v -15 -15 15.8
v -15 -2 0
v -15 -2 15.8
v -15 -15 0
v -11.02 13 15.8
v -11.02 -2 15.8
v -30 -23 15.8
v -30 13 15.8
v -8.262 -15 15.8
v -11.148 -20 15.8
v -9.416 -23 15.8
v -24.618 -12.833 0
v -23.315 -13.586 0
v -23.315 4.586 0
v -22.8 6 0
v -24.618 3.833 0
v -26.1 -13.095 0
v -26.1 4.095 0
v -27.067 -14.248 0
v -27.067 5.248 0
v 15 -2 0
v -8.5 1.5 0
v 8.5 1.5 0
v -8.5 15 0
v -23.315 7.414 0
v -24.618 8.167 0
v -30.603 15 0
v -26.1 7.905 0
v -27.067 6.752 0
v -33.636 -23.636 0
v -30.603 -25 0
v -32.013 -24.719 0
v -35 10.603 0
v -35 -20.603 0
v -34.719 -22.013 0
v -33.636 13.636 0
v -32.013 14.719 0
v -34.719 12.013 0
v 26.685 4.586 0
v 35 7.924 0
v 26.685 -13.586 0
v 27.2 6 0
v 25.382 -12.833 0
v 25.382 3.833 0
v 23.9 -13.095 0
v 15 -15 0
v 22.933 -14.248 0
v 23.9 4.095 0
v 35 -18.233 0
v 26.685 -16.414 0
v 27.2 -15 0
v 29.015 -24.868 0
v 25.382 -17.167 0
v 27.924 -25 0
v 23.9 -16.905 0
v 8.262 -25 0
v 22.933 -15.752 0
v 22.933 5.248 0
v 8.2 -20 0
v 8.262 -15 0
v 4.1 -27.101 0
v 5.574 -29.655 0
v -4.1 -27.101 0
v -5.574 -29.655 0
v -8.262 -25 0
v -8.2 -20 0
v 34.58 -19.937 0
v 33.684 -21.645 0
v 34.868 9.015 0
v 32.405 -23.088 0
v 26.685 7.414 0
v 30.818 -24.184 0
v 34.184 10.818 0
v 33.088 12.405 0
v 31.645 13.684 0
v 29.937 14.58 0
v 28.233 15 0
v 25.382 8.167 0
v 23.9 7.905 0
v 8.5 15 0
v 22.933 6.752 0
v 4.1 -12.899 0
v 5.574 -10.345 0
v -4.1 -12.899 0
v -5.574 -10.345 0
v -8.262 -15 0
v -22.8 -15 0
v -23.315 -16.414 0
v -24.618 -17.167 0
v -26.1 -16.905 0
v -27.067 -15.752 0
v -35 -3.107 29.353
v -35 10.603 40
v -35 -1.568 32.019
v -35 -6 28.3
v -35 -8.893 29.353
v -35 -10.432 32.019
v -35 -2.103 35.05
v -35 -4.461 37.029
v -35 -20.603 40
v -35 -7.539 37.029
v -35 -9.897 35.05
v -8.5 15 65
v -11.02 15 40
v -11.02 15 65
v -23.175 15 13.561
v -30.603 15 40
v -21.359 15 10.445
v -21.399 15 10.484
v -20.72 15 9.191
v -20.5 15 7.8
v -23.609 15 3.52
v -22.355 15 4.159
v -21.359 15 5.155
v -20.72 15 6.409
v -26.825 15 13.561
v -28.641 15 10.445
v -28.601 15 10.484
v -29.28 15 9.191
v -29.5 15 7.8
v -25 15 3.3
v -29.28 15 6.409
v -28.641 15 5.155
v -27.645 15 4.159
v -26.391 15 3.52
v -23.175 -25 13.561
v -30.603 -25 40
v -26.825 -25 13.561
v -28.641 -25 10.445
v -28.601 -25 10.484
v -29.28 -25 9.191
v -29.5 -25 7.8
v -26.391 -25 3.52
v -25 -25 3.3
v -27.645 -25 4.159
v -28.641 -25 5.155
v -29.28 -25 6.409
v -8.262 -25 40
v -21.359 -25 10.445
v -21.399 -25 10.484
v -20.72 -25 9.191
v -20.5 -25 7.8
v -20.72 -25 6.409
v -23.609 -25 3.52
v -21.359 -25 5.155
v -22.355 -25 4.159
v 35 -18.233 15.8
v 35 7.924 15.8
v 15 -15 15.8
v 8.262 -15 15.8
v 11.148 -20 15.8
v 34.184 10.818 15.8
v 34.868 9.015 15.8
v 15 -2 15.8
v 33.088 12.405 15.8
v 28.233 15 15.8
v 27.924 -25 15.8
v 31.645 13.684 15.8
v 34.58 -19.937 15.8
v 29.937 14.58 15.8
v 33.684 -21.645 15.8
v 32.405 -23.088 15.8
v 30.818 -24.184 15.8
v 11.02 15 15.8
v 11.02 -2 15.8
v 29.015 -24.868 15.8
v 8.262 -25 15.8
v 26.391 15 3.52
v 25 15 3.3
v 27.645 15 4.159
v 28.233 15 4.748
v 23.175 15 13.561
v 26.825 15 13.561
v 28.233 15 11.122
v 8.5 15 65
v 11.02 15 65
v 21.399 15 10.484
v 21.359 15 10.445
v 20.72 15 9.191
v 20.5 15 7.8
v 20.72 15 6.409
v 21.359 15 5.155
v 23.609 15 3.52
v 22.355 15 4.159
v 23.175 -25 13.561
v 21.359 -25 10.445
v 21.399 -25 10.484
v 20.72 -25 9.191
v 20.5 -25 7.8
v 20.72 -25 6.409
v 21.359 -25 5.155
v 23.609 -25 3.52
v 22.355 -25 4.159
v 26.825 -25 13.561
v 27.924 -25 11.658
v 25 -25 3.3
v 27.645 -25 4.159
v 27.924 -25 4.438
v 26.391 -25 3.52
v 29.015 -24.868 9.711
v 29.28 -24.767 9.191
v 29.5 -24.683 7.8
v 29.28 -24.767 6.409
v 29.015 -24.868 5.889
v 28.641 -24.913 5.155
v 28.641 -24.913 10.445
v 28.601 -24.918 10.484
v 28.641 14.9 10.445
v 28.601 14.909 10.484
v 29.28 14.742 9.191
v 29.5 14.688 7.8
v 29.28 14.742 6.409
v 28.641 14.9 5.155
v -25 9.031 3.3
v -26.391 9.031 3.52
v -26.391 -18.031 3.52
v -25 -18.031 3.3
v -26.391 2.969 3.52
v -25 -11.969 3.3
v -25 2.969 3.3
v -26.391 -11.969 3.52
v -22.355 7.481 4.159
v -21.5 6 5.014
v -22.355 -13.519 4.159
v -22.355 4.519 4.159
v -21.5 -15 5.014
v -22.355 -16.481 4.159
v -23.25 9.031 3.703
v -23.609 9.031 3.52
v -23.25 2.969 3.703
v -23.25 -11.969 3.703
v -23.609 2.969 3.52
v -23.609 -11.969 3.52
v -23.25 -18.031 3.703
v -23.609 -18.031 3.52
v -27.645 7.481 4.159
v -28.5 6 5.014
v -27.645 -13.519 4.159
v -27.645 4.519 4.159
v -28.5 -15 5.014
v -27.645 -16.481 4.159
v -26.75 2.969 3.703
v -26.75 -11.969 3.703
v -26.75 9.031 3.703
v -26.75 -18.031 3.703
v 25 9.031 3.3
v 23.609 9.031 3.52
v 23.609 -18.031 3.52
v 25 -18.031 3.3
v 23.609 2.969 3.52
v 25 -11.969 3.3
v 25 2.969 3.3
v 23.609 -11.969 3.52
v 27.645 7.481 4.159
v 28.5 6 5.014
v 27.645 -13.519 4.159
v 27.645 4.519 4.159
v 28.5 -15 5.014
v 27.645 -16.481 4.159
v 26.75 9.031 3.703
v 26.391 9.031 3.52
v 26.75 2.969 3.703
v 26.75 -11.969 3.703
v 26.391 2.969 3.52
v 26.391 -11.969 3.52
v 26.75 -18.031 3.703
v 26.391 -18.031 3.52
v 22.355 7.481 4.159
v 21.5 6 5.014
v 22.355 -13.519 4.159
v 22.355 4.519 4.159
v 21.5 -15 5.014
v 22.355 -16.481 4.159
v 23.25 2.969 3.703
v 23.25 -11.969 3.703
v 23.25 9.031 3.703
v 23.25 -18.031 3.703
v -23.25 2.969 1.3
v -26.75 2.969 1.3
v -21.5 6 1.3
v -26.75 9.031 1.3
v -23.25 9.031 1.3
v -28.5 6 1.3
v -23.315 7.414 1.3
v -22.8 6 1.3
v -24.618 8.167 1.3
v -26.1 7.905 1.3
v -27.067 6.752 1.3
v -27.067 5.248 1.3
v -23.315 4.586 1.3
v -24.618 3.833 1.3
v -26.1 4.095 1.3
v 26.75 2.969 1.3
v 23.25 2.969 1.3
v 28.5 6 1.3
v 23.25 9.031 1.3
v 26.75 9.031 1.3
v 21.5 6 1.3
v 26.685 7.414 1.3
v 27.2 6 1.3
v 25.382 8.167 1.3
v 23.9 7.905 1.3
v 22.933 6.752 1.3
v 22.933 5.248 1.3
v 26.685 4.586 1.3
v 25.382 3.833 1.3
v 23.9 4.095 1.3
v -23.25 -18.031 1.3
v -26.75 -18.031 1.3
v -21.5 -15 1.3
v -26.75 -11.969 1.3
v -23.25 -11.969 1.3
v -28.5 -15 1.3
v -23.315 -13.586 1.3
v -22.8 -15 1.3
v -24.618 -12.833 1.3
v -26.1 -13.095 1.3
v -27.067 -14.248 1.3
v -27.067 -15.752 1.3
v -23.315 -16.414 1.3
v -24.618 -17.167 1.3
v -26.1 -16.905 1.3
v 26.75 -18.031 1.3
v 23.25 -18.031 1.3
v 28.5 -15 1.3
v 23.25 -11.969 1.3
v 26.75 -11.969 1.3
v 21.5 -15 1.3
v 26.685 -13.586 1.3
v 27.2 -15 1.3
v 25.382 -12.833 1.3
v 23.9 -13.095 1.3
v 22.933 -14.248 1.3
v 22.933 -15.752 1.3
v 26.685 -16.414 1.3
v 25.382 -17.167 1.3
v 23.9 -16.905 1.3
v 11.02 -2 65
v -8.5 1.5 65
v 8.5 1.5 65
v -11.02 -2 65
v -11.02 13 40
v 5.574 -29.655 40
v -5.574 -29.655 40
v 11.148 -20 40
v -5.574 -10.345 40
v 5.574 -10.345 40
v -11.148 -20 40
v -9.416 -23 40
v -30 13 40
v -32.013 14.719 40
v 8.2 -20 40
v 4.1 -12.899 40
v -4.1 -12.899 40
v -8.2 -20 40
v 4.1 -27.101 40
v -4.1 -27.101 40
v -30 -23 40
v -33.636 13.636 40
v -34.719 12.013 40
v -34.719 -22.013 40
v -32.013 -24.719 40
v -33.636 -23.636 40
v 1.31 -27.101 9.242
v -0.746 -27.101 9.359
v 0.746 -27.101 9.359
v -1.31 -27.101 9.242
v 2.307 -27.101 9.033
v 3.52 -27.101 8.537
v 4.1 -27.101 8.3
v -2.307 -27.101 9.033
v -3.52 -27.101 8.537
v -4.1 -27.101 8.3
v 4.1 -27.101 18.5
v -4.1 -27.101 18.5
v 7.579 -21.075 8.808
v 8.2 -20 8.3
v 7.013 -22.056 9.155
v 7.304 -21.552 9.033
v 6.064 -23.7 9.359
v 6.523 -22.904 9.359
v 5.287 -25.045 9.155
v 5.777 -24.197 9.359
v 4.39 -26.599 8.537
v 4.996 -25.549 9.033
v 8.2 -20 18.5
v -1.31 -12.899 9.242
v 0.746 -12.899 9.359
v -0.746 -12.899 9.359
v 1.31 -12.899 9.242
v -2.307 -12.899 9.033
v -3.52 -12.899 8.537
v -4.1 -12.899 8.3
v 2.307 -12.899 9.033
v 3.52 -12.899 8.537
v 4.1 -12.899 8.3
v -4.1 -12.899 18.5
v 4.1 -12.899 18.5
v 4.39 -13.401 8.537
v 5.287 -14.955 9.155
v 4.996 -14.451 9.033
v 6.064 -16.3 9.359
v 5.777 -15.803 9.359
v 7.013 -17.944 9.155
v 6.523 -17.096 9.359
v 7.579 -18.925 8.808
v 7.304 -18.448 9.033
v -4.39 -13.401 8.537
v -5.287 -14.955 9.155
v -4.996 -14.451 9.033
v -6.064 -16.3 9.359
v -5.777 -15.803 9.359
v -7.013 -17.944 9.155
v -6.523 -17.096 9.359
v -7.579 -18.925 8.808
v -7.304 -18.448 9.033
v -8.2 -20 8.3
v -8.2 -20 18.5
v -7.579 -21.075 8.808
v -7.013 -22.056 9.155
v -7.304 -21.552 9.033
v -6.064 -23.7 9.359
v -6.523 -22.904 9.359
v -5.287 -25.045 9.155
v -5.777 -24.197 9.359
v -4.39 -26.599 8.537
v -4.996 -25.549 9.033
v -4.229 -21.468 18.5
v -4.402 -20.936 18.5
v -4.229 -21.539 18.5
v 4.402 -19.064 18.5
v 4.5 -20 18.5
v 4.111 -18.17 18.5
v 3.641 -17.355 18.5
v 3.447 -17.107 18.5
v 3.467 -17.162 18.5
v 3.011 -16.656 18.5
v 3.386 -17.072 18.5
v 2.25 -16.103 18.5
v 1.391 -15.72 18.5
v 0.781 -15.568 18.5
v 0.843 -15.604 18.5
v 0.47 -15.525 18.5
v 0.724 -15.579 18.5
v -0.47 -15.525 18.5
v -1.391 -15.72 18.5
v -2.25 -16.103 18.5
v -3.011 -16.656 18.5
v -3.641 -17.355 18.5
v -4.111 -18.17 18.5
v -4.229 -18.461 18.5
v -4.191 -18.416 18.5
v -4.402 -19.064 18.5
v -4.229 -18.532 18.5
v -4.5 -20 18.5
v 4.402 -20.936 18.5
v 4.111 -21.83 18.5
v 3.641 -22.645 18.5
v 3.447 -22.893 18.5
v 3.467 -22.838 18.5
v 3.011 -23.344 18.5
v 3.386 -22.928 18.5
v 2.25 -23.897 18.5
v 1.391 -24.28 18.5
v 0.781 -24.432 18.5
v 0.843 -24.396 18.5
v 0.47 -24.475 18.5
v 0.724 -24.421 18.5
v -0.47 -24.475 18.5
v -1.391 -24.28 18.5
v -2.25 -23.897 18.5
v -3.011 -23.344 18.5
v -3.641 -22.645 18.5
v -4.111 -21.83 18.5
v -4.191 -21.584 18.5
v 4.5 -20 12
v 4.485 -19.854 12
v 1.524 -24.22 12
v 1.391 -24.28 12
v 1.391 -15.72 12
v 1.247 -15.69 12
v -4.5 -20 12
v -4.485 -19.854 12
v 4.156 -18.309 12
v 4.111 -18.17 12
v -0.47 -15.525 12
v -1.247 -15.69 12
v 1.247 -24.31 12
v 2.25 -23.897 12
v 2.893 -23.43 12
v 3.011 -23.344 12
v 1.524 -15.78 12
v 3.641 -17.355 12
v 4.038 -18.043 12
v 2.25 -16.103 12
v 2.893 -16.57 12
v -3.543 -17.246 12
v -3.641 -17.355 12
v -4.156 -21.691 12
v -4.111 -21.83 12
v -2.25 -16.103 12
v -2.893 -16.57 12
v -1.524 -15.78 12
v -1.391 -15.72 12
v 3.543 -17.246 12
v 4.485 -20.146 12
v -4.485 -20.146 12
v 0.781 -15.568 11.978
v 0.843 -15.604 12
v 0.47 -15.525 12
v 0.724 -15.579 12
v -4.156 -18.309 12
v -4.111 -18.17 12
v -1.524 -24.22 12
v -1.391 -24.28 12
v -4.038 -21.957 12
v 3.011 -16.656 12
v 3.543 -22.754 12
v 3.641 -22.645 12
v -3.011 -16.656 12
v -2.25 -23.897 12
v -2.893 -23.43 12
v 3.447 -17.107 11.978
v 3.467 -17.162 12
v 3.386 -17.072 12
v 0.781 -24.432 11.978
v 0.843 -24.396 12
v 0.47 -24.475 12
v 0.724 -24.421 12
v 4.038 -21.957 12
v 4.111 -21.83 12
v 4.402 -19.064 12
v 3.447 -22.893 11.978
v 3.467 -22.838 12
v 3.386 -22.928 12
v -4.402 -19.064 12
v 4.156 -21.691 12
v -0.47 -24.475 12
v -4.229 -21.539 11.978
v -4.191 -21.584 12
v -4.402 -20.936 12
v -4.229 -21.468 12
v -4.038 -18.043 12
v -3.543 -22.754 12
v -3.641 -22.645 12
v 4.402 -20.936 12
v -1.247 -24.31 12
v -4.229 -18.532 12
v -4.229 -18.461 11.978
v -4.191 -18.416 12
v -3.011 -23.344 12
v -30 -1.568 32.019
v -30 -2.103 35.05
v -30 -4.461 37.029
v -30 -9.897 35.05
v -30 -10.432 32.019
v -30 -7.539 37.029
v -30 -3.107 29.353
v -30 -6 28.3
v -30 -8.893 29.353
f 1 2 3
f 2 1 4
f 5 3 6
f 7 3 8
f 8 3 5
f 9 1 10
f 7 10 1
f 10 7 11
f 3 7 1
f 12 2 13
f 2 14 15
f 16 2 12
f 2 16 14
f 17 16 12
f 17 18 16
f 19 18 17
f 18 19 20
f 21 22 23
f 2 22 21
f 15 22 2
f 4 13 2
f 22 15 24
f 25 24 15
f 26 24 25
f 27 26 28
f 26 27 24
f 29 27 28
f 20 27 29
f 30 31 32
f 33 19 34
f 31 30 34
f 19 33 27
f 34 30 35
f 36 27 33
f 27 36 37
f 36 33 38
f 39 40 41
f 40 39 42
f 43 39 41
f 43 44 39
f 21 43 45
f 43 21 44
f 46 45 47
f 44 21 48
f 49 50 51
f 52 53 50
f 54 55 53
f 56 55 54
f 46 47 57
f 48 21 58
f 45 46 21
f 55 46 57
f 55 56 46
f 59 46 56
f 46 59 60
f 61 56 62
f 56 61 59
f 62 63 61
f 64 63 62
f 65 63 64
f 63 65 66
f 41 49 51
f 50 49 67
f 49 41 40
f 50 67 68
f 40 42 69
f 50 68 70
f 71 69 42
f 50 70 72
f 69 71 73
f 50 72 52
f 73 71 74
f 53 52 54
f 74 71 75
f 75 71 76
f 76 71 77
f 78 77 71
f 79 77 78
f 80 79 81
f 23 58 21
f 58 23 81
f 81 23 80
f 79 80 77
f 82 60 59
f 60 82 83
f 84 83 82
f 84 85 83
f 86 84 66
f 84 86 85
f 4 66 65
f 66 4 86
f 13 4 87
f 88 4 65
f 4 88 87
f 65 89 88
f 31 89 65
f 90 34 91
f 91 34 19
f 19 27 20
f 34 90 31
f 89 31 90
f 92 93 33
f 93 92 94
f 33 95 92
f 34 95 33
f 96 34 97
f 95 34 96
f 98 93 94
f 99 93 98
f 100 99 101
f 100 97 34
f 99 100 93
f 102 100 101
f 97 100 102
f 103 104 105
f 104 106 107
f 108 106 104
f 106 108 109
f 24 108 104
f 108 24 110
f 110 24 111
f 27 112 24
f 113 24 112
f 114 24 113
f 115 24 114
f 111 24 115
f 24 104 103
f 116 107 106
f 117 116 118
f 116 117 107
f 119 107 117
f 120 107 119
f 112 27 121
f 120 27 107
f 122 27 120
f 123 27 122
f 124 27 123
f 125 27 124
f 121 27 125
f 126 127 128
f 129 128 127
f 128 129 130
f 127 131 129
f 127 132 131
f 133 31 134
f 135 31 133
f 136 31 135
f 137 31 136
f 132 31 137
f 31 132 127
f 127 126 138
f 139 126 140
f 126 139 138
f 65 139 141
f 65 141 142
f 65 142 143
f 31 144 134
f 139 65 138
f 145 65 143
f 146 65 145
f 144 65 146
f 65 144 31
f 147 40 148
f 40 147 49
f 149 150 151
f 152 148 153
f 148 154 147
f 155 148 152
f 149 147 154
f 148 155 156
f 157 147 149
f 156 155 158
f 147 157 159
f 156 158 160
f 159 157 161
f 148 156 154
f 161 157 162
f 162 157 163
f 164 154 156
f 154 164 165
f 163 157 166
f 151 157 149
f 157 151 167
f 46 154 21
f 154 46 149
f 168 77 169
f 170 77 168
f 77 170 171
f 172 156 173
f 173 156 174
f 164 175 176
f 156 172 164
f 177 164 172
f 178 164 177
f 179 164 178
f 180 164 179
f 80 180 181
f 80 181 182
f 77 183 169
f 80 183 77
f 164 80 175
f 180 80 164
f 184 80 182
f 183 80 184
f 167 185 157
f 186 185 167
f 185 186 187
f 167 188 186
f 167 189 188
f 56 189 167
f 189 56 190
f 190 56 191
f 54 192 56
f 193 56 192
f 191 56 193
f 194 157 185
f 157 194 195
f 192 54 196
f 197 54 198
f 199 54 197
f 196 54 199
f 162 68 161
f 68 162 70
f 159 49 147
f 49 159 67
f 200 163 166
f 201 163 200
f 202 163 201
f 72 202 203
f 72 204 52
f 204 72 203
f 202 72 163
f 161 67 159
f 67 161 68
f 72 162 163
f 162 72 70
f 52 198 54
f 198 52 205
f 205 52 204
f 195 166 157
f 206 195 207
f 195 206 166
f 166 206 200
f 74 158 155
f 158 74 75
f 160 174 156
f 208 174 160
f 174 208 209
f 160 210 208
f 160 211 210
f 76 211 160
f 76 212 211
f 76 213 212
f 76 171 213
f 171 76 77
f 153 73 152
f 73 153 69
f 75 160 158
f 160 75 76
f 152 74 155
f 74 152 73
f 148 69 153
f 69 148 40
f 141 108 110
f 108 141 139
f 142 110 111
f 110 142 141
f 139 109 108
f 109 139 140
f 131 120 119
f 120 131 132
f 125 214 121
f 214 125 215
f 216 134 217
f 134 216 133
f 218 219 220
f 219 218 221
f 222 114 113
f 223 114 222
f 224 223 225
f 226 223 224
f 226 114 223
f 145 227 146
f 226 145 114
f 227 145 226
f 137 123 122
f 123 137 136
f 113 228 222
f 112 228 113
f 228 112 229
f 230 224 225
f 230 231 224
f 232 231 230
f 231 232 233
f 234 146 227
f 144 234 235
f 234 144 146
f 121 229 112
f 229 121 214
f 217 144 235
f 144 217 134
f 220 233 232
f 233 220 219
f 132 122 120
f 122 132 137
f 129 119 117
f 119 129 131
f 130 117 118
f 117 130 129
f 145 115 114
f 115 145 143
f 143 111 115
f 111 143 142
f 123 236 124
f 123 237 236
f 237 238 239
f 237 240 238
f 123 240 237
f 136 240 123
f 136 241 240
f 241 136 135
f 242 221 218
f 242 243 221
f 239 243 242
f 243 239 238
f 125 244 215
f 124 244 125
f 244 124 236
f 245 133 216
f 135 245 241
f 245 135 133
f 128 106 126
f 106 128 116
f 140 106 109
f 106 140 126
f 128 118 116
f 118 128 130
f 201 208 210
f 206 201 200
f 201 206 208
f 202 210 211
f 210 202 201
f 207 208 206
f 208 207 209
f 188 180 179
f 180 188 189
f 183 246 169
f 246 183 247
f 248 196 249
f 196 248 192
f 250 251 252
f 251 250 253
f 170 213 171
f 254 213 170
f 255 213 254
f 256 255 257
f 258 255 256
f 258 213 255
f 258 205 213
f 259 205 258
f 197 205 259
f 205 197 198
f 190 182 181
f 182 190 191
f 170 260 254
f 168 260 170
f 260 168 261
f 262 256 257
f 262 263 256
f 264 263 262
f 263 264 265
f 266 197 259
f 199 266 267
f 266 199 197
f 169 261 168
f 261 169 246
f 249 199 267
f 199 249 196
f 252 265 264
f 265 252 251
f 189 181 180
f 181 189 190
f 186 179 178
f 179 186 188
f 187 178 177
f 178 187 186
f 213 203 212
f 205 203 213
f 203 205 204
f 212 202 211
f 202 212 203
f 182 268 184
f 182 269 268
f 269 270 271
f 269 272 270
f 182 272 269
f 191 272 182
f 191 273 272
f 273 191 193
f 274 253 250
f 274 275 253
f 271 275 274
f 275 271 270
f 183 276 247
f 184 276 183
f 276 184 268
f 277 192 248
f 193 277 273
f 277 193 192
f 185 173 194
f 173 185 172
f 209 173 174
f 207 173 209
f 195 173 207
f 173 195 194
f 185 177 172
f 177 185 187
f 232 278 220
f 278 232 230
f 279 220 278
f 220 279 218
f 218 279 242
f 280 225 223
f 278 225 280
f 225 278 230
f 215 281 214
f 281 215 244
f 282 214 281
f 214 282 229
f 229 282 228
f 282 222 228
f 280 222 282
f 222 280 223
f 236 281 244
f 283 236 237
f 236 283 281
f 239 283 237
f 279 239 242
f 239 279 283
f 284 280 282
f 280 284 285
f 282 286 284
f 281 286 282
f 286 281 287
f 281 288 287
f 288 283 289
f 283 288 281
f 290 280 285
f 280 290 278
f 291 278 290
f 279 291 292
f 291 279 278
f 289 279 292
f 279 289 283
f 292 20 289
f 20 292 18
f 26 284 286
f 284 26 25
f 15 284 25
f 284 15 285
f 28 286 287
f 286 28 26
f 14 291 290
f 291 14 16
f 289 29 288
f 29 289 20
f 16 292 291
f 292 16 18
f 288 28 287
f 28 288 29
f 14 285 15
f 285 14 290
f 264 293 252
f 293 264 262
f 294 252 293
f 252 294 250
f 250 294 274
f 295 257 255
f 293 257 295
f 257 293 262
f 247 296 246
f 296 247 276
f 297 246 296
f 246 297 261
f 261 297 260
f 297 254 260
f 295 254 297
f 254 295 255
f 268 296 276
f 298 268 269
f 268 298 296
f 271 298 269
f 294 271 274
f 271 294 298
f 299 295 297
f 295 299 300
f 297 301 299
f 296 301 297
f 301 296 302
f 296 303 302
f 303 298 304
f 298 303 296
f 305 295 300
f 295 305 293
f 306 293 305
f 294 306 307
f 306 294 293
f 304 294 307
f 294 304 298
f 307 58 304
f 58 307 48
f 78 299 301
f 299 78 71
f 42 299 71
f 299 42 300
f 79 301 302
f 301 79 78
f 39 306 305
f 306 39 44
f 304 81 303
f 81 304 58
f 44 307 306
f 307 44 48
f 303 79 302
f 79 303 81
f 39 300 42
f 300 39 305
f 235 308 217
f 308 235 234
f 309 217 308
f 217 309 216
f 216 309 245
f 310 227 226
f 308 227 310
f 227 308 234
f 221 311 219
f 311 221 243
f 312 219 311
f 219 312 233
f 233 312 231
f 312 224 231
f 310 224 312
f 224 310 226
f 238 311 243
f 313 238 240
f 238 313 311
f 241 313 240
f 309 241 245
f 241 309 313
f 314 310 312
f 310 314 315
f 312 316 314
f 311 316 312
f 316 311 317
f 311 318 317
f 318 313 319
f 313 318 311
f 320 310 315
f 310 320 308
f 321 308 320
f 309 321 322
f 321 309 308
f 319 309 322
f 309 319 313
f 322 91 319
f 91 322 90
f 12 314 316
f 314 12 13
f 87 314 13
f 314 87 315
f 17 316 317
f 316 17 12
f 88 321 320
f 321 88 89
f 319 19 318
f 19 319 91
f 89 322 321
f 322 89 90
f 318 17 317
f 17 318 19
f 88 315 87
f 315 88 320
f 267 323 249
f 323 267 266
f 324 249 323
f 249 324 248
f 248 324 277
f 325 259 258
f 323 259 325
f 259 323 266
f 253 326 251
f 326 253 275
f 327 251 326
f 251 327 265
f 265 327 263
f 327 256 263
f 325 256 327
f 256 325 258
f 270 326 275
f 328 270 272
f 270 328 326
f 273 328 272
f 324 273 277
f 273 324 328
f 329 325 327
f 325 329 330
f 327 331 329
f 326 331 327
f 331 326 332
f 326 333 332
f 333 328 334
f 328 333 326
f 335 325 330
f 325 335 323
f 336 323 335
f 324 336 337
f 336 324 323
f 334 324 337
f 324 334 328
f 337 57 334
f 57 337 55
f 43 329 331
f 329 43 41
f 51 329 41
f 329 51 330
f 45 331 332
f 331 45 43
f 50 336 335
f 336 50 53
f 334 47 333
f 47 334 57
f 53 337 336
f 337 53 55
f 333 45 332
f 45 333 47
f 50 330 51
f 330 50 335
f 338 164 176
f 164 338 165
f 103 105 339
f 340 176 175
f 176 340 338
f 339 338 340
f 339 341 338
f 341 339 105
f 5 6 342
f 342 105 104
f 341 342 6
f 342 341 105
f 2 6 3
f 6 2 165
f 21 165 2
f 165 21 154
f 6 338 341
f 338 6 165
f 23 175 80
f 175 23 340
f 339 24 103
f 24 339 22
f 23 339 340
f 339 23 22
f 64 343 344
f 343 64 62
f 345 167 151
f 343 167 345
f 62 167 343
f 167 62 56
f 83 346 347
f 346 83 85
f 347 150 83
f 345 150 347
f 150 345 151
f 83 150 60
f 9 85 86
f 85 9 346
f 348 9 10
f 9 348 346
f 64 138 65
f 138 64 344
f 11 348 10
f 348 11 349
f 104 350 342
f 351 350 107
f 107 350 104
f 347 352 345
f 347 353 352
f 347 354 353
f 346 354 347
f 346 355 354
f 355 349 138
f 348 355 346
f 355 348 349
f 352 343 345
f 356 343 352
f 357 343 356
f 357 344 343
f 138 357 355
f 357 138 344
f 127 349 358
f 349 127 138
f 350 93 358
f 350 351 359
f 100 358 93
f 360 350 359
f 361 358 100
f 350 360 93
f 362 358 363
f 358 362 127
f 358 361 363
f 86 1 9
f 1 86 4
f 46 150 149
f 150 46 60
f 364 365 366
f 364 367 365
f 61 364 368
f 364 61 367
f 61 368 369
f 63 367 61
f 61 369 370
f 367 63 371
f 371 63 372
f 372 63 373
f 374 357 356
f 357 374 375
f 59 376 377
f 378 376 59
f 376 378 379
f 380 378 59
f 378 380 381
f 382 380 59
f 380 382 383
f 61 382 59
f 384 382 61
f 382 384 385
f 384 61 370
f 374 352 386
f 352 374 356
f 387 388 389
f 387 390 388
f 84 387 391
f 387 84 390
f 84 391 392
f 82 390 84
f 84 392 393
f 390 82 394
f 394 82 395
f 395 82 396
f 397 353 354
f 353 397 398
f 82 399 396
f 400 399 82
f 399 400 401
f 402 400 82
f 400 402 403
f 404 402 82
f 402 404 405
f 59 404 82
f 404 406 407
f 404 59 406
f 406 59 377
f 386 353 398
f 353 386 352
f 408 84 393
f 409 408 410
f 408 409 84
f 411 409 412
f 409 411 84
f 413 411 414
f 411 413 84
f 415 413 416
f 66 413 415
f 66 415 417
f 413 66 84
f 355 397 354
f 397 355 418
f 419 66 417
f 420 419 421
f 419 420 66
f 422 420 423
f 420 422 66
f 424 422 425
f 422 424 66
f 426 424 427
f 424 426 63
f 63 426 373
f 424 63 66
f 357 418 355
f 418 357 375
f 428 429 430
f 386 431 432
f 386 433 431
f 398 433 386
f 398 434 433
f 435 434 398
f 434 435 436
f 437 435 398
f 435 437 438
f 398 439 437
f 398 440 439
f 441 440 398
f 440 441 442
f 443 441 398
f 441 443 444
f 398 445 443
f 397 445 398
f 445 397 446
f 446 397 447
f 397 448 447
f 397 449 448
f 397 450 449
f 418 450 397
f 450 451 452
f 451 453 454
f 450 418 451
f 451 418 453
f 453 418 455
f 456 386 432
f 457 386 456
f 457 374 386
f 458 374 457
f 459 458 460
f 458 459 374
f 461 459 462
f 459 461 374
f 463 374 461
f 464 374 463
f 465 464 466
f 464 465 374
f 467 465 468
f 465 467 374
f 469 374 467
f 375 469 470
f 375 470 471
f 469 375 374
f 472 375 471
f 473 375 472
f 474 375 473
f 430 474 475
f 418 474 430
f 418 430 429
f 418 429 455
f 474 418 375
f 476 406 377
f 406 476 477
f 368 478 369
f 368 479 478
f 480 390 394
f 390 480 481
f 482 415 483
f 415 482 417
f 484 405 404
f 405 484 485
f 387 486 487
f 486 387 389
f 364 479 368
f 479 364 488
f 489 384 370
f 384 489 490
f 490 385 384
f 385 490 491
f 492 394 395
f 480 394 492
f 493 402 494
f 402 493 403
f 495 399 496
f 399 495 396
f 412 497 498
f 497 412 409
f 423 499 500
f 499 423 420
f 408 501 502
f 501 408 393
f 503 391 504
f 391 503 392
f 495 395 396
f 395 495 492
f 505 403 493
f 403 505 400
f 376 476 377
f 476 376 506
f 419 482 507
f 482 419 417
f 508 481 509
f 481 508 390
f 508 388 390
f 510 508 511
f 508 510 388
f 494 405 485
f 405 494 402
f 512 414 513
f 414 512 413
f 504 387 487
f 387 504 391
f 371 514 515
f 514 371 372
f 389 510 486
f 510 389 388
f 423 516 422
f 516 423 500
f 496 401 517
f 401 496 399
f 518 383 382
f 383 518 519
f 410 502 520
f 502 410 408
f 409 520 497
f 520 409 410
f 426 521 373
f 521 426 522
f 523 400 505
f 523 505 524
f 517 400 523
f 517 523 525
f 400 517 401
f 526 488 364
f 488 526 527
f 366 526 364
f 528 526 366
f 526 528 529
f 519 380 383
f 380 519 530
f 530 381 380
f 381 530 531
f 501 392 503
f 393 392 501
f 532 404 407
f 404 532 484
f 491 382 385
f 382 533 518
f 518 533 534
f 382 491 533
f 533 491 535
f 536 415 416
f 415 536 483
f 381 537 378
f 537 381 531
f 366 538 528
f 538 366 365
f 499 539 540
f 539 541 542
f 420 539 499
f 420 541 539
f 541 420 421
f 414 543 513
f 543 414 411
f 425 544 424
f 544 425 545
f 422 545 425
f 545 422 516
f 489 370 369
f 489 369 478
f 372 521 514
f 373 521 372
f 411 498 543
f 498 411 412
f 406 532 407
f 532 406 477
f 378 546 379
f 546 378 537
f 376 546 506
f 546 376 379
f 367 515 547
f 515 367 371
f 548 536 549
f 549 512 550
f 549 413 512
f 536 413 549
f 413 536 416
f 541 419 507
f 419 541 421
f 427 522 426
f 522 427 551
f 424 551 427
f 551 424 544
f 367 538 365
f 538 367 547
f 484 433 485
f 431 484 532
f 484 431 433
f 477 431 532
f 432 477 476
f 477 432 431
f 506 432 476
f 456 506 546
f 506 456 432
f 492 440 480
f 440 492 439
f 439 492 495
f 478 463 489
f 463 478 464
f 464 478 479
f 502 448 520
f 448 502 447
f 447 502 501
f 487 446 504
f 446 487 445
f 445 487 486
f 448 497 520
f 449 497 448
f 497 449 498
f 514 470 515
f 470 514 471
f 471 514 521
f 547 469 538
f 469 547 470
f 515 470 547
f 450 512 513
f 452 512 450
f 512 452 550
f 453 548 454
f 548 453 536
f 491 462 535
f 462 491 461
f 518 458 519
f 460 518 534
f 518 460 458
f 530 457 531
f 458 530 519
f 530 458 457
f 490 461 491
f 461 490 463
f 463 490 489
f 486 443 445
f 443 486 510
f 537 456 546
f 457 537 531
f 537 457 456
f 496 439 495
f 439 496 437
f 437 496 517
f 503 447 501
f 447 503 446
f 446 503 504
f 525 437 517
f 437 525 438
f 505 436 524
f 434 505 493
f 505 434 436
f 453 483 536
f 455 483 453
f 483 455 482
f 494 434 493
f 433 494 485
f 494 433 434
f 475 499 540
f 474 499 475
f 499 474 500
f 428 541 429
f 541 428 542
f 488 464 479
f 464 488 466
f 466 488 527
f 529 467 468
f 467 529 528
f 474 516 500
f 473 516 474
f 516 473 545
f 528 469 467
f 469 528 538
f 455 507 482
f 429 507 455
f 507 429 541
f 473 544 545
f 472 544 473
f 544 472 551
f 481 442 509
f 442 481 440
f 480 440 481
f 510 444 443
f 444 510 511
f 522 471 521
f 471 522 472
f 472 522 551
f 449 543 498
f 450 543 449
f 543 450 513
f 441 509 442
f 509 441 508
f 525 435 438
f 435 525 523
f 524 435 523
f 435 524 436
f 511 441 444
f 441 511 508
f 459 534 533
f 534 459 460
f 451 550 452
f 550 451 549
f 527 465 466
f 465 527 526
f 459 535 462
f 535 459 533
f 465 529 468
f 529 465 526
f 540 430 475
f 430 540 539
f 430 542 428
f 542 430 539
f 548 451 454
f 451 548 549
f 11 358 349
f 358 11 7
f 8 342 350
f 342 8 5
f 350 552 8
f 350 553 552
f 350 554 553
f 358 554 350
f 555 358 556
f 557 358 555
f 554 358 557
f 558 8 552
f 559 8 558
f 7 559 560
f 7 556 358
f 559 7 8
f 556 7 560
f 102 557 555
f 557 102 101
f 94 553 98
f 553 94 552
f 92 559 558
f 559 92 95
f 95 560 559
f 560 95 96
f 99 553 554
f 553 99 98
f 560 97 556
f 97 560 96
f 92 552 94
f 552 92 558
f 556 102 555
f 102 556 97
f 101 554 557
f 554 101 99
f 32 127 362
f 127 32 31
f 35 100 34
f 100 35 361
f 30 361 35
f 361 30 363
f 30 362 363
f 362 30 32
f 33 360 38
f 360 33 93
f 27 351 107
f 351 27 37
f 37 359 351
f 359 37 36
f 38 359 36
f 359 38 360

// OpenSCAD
// file: ../configuration.scad
// PRUSA Mendel  
// Configuration file
// GNU GPL v2
// Josef Pra
// josefprusa@me.com
// prusadjs.cz
// http://www.reprap.org/wiki/Prusa_Mendel
// http://github.com/prusajr/PrusaMendel


// PLEASE SELECT ONE OF THE CONFIGURATIONS BELOW
// BY UN-COMMENTING IT


variant=0; //0 for metric
//variant=1; //1 for SAE
if(variant==0){
echo("variant: metric");
}else if(variant==1){
echo("variant: sae");
} else{
echo("WARNING: INVALID CONFIGURATION");
}




vars=[
//[m8_dia, m8_nut, m4_dia, m4_nut, m3_dia, m3_nut, bush_dia, mot_shaft, bush_rod, bush_outerdia, bush_length]
[9,16.4,5,9,4.4,7,11,5.3,8,16,11],//metric
[9,15.7,5.5,10.6,5.5,10.6,11.5,5.3,7.9375,16,11]//SAE
];


//BUSHING TYPE Can generate three versions
// 1 - regular old ones
// 2 - helical ones
// 3 - holders for brass or any other bought bushings
bushing_type = 2;


//Round corner diameter
round_corner_diameter = 8;


//Thin wall size
layer_height = 0.4;
perimeter_width_over_thicknes = 1.6;
infill_widht_over_thickness = 1.55;
thin_wall = 2*(perimeter_width_over_thicknes*layer_height+infill_widht_over_thickness*layer_height);
if(thin_wall<2){
	echo("Check thin wall size, its below 2mm!");
}
echo(thin_wall);


//DO NOT TOUCH THIS SECTION!
m8_diameter = vars[variant][0];
m8_nut_diameter = vars[variant][1];
m4_diameter = vars[variant][2];
m4_nut_diameter = vars[variant][3];
m3_diameter = vars[variant][4];
m3_nut_diameter = vars[variant][5];
bushing_diameter = vars[variant][6];
motor_shaft=vars[variant][7];
bushing_rodsize = vars[variant][8];
bushing_outerDiameter = vars[variant][9];
bushing_lenght = vars[variant][10];




// MINI-HUXLEY VERSION (TODO, just place holder)
// include <configuration-huxley.scad>


// MEGA VERSION (TODO, just place holder)
// include <configuration-mega.scad>




// Some basic functions, probably should be somewhere else
module roundcorner(diameter){
	difference(){
		cube(size = [diameter,diameter,99], center = false);
		translate(v = [diameter, diameter, 0]) cylinder(h = 100, r=diameter, center=true);
	}
}
// main file
// PRUSA Mendel  
// X-end with idler mount
// GNU GPL v2
// Josef Průša
// josefprusa@me.com
// prusadjs.cz
// http://www.reprap.org/wiki/Prusa_Mendel
// http://github.com/prusajr/PrusaMendel

include <../configuration.scad>
corection = 1.17; 

// Modified by Adrian to remove bridges and to add a conical cavity for the bottom nut; this
// prints more cleanly and reliably.  26 May 2011

/**
 *@name X end idler
 *@using 2 bushing
 *@using 1 m8spring
 *@using 2 m8nut
 */

module xendidler(){
difference(){
translate(v = [0,35,24.5]) union(){ 

difference(){
union(){
translate(v = [-25, -40, -16.6])cube(size = [20,40,15.8], center = true);
translate(v = [25, -40, -16.6])cube(size = [20,40,15.8], center = true);
}
//nut traps

translate(v = [-25, -29, -19.7]) cylinder(h = 7, r=m3_nut_diameter/2, $fn=6, center=true);
translate(v = [-25, -29, -20]) cylinder(h = 10, r=m3_diameter/2, $fn=9, center=true);
translate(v = [25, -29, -19.7]) cylinder(h = 7, r=m3_nut_diameter/2, $fn=6, center=true);
translate(v = [25, -29, -20]) cylinder(h = 10, r=m3_diameter/2, $fn=9, center=true);

translate(v = [-25, -50, -19.7]) cylinder(h = 7, r=m3_nut_diameter/2, $fn=6, center=true);
translate(v = [-25, -50, -20]) cylinder(h = 10, r=m3_diameter/2, $fn=9, center=true);
translate(v = [25, -50, -19.7]) cylinder(h = 7, r=m3_nut_diameter/2, $fn=6, center=true);
translate(v = [25, -50, -20]) cylinder(h = 10, r=m3_diameter/2, $fn=9, center=true);


//round corners
translate(v = [35.1, -60.1, -25]) rotate(a=[0,0,90]) roundcorner(round_corner_diameter);
translate(v = [35.1, -19.9, -25]) rotate(a=[0,0,-180]) roundcorner(round_corner_diameter);


//holes for X axis
translate(v = [-25, -18, -16.7]) rotate(a=[90,0,0]) {
	translate(v = [0, 0, 22]) cylinder(h = 42, r=4.5, $fn=20, center=true);
	translate(v = [0, 2.60, 22]) rotate(a=[0,0,0]) cylinder(h = 42, r=3.65, $fn=6, center=true);
}
translate(v = [25, -18, -16.7]) rotate(a=[90,0,0]) {
	translate(v = [0, 0, 22]) cylinder(h = 42, r=4.5, $fn=20, center=true);
	translate(v = [0, 2.60, 22]) rotate(a=[0,0,0]) cylinder(h = 42, r=3.65, $fn=6, center=true);
}
//slider cutouts
translate(v = [0, -25, 15]) 
	difference(){
	translate(v = [0, -0, -14.5])cube(size = [23,23,50], center = true);
	}
//nut trap
translate(v = [0, -55, 15]) {
	difference(){
	translate(v = [0, -0, -15])cylinder(h = 50, r=m8_nut_diameter/2+thin_wall, $fn=6, center=true);
	}
}
}

//slider
translate(v = [0, -25, 15]) 
	difference(){
union(){
	translate(v = [0, -3.5, -7]) cube(size = [17+2*thin_wall,17,65], center = true);

	translate(v = [0, -3.5, -31.6]) cube(size = [33,17,15.8], center = true);}
	translate(v = [0, -0, -7])cube(size = [17,17,70], center = true);}

//nut trap
//correction for thin wall



translate(v = [0, -55, 15]) {
difference(){
	union(){difference(){
union(){
	translate(v = [0, -0, -19.5])cylinder(h = 40, r=m8_nut_diameter/2+thin_wall*corection, $fn=6, center=true);
	translate(v = [0, 0, -31.6]) cube(size = [35,10,15.8], center = true);
	}
	cylinder(h = 90, r=m8_nut_diameter/2, $fn=6, center=true);
	}

// Generate nut barrier with conical lead in under.  Replace this...

	//translate(v = [10, 0, -31]) cylinder(h = 4, r=m8_nut_diameter/2+thin_wall, $fn=6, center=true);

// ... with this--------
	difference()
	{
	translate(v = [0, 0, -29]) cylinder(h = 16, r=m8_nut_diameter/2+thin_wall, $fn=6, center=true);
	translate(v = [0, 0, -32]) cylinder(h = 10, r1=10+4, r2=4, $fn=30, center=true);
	cylinder(h = 100, r=4.5, $fn=30, center=true);
	}

//---------

	}
	translate(v = [0, 0, 12.5]) cylinder(h = 90, r=m8_diameter/2, $fn=9, center=true);
}
}


//idler wheel connector
mirror(){
translate(v = [0, -35, -12]) difference(){
union(){
translate(v = [21, -24, 15]) cube(size = [25.5,2,25], center = true); // New web
translate(v = [21, 14, 15]) cube(size = [24,2,25], center = true); // New web
translate(v = [32.5, -5, 12.5]) cube(size = [5,40,30], center = true);
}

translate(v = [32.5, -6, 28-3-4.7]) rotate(a=[0,90,0]) cylinder(h = 90, r=m8_diameter/2, $fn=9, center=true);
//translate(v = [35.1,-25.1,-5]) rotate(a=[0,0,90]) roundcorner(3);
//translate(v = [-35.1, -19.9, -25]) rotate(a=[0,0,-90]) roundcorner(3);

}
}}

//two more rounded corners
translate(v = [-35.1,-25.1,-5]) rotate(a=[0,0,0]) roundcorner(5);
translate(v = [-35.1, +15.1, -5]) rotate(a=[0,0,-90]) roundcorner(5);
}
}




xendidler();
